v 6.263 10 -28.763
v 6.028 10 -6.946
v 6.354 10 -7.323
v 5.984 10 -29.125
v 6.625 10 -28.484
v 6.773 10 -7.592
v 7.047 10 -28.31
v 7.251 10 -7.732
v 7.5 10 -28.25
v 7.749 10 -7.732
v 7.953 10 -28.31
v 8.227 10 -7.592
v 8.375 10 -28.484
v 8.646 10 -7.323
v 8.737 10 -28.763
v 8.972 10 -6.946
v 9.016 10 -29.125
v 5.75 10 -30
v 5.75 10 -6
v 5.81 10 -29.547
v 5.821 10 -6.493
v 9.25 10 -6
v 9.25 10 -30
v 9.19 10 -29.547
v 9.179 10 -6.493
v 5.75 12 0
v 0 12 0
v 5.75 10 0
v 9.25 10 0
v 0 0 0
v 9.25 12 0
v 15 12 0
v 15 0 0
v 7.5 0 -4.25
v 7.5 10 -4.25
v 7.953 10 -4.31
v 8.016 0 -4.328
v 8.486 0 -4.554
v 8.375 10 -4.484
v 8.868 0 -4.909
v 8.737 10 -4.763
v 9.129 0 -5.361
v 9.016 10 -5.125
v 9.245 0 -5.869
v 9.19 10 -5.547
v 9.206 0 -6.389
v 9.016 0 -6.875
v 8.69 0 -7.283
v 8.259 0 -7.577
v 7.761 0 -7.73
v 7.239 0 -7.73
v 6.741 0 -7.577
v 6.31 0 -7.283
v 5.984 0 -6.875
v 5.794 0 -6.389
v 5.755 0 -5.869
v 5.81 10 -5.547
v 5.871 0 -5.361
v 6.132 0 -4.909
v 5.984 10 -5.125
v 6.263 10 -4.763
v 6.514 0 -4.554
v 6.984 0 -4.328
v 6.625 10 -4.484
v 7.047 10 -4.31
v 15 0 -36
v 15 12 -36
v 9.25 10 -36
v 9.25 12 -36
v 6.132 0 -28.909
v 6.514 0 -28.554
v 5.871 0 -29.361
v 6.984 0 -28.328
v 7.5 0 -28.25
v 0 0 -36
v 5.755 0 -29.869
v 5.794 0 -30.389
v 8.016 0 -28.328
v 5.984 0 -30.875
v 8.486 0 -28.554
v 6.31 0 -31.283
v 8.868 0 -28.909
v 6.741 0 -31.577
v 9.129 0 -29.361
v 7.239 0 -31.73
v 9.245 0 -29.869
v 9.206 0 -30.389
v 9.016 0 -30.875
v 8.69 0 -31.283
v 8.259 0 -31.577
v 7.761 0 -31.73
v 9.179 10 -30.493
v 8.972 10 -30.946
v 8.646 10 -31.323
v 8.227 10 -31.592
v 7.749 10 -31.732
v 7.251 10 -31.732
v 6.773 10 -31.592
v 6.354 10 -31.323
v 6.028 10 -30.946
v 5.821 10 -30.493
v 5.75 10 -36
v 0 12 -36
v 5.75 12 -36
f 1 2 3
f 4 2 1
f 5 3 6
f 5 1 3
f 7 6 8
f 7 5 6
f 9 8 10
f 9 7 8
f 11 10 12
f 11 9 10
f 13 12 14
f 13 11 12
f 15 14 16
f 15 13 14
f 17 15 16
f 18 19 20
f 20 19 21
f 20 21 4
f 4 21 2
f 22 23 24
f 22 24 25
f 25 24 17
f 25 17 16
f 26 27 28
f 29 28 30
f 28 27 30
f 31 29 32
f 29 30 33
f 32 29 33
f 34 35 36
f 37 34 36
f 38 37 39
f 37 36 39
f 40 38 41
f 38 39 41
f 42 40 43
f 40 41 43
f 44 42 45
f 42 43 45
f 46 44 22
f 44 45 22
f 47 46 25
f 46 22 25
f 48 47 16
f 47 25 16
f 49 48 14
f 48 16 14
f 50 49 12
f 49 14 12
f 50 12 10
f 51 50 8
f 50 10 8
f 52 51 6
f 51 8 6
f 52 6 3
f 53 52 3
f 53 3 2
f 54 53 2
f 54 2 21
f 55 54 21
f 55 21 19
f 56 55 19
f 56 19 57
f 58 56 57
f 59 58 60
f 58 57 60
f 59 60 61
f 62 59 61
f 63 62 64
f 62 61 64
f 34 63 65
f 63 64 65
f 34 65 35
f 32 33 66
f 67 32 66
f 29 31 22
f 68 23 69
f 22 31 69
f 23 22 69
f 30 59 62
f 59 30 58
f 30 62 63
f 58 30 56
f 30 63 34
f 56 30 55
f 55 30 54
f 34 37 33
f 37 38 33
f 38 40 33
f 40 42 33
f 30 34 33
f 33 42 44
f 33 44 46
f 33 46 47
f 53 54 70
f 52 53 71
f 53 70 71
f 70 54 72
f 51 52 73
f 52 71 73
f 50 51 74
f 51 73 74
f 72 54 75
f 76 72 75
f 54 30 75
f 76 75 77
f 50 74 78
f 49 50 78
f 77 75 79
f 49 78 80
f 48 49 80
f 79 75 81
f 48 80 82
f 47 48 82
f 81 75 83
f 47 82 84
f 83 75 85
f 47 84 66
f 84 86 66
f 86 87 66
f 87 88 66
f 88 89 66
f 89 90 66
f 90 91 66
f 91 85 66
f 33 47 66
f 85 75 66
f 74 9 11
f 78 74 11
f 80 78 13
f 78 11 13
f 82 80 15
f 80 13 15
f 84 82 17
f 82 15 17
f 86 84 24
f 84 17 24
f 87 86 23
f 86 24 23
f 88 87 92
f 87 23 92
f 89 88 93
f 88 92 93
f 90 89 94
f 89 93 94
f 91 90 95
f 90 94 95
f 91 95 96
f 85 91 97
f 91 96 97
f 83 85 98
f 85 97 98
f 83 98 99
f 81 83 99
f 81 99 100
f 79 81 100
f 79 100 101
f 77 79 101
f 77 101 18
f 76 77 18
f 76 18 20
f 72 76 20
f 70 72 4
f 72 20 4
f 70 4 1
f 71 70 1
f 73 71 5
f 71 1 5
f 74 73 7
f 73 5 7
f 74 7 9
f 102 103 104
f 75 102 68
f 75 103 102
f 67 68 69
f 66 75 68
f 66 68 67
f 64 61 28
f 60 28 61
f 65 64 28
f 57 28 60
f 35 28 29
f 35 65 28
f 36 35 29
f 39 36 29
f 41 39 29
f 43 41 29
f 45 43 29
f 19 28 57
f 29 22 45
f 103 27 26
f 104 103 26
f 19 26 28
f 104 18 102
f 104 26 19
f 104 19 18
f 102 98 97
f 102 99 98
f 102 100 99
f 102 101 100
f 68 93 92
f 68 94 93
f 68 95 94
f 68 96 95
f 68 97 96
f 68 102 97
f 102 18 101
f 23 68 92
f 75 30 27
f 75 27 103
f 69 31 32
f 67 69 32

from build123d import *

# Parameters (mm, degrees)
SKETCH1_W           = 15
SKETCH1_H           = 36
BOSS_EXTRUDE1_DEPTH = 12
SKETCH2_R           = 1.75
CUT_EXTRUDE1_DEPTH  = 12
SKETCH3_W           = 3.5
SKETCH3_H           = 36
CUT_EXTRUDE2_DEPTH  = 2


with BuildPart() as part:
    # Sketch1 → Boss-Extrude1 (new body)
    with BuildSketch(Plane(origin=(0, 0, 0), x_dir=(1, 0, 0), z_dir=(0, 1, 0))):
        with Locations((7.5, 18)):
            Rectangle(SKETCH1_W, SKETCH1_H)
    extrude(amount=BOSS_EXTRUDE1_DEPTH)

    # Sketch2 → Cut-Extrude1 (cut)
    with BuildSketch(Plane(origin=(0, 12, 0), x_dir=(1, 0, 0), z_dir=(0, 1, 0))):
        with Locations(Location((7.5, 30, 0), (0, 0, 270))):
            Circle(SKETCH2_R)
        with Locations(Location((7.5, 6, 0), (0, 0, 270))):
            Circle(SKETCH2_R)
    extrude(amount=-CUT_EXTRUDE1_DEPTH, mode=Mode.SUBTRACT)

    # Sketch3 → Cut-Extrude2 (cut)
    with BuildSketch(Plane(origin=(0, 12, 0), x_dir=(1, 0, 0), z_dir=(0, 1, 0))):
        with Locations((7.5, 18)):
            Rectangle(SKETCH3_W, SKETCH3_H)
    extrude(amount=-CUT_EXTRUDE2_DEPTH, mode=Mode.SUBTRACT)


solid = part.part
